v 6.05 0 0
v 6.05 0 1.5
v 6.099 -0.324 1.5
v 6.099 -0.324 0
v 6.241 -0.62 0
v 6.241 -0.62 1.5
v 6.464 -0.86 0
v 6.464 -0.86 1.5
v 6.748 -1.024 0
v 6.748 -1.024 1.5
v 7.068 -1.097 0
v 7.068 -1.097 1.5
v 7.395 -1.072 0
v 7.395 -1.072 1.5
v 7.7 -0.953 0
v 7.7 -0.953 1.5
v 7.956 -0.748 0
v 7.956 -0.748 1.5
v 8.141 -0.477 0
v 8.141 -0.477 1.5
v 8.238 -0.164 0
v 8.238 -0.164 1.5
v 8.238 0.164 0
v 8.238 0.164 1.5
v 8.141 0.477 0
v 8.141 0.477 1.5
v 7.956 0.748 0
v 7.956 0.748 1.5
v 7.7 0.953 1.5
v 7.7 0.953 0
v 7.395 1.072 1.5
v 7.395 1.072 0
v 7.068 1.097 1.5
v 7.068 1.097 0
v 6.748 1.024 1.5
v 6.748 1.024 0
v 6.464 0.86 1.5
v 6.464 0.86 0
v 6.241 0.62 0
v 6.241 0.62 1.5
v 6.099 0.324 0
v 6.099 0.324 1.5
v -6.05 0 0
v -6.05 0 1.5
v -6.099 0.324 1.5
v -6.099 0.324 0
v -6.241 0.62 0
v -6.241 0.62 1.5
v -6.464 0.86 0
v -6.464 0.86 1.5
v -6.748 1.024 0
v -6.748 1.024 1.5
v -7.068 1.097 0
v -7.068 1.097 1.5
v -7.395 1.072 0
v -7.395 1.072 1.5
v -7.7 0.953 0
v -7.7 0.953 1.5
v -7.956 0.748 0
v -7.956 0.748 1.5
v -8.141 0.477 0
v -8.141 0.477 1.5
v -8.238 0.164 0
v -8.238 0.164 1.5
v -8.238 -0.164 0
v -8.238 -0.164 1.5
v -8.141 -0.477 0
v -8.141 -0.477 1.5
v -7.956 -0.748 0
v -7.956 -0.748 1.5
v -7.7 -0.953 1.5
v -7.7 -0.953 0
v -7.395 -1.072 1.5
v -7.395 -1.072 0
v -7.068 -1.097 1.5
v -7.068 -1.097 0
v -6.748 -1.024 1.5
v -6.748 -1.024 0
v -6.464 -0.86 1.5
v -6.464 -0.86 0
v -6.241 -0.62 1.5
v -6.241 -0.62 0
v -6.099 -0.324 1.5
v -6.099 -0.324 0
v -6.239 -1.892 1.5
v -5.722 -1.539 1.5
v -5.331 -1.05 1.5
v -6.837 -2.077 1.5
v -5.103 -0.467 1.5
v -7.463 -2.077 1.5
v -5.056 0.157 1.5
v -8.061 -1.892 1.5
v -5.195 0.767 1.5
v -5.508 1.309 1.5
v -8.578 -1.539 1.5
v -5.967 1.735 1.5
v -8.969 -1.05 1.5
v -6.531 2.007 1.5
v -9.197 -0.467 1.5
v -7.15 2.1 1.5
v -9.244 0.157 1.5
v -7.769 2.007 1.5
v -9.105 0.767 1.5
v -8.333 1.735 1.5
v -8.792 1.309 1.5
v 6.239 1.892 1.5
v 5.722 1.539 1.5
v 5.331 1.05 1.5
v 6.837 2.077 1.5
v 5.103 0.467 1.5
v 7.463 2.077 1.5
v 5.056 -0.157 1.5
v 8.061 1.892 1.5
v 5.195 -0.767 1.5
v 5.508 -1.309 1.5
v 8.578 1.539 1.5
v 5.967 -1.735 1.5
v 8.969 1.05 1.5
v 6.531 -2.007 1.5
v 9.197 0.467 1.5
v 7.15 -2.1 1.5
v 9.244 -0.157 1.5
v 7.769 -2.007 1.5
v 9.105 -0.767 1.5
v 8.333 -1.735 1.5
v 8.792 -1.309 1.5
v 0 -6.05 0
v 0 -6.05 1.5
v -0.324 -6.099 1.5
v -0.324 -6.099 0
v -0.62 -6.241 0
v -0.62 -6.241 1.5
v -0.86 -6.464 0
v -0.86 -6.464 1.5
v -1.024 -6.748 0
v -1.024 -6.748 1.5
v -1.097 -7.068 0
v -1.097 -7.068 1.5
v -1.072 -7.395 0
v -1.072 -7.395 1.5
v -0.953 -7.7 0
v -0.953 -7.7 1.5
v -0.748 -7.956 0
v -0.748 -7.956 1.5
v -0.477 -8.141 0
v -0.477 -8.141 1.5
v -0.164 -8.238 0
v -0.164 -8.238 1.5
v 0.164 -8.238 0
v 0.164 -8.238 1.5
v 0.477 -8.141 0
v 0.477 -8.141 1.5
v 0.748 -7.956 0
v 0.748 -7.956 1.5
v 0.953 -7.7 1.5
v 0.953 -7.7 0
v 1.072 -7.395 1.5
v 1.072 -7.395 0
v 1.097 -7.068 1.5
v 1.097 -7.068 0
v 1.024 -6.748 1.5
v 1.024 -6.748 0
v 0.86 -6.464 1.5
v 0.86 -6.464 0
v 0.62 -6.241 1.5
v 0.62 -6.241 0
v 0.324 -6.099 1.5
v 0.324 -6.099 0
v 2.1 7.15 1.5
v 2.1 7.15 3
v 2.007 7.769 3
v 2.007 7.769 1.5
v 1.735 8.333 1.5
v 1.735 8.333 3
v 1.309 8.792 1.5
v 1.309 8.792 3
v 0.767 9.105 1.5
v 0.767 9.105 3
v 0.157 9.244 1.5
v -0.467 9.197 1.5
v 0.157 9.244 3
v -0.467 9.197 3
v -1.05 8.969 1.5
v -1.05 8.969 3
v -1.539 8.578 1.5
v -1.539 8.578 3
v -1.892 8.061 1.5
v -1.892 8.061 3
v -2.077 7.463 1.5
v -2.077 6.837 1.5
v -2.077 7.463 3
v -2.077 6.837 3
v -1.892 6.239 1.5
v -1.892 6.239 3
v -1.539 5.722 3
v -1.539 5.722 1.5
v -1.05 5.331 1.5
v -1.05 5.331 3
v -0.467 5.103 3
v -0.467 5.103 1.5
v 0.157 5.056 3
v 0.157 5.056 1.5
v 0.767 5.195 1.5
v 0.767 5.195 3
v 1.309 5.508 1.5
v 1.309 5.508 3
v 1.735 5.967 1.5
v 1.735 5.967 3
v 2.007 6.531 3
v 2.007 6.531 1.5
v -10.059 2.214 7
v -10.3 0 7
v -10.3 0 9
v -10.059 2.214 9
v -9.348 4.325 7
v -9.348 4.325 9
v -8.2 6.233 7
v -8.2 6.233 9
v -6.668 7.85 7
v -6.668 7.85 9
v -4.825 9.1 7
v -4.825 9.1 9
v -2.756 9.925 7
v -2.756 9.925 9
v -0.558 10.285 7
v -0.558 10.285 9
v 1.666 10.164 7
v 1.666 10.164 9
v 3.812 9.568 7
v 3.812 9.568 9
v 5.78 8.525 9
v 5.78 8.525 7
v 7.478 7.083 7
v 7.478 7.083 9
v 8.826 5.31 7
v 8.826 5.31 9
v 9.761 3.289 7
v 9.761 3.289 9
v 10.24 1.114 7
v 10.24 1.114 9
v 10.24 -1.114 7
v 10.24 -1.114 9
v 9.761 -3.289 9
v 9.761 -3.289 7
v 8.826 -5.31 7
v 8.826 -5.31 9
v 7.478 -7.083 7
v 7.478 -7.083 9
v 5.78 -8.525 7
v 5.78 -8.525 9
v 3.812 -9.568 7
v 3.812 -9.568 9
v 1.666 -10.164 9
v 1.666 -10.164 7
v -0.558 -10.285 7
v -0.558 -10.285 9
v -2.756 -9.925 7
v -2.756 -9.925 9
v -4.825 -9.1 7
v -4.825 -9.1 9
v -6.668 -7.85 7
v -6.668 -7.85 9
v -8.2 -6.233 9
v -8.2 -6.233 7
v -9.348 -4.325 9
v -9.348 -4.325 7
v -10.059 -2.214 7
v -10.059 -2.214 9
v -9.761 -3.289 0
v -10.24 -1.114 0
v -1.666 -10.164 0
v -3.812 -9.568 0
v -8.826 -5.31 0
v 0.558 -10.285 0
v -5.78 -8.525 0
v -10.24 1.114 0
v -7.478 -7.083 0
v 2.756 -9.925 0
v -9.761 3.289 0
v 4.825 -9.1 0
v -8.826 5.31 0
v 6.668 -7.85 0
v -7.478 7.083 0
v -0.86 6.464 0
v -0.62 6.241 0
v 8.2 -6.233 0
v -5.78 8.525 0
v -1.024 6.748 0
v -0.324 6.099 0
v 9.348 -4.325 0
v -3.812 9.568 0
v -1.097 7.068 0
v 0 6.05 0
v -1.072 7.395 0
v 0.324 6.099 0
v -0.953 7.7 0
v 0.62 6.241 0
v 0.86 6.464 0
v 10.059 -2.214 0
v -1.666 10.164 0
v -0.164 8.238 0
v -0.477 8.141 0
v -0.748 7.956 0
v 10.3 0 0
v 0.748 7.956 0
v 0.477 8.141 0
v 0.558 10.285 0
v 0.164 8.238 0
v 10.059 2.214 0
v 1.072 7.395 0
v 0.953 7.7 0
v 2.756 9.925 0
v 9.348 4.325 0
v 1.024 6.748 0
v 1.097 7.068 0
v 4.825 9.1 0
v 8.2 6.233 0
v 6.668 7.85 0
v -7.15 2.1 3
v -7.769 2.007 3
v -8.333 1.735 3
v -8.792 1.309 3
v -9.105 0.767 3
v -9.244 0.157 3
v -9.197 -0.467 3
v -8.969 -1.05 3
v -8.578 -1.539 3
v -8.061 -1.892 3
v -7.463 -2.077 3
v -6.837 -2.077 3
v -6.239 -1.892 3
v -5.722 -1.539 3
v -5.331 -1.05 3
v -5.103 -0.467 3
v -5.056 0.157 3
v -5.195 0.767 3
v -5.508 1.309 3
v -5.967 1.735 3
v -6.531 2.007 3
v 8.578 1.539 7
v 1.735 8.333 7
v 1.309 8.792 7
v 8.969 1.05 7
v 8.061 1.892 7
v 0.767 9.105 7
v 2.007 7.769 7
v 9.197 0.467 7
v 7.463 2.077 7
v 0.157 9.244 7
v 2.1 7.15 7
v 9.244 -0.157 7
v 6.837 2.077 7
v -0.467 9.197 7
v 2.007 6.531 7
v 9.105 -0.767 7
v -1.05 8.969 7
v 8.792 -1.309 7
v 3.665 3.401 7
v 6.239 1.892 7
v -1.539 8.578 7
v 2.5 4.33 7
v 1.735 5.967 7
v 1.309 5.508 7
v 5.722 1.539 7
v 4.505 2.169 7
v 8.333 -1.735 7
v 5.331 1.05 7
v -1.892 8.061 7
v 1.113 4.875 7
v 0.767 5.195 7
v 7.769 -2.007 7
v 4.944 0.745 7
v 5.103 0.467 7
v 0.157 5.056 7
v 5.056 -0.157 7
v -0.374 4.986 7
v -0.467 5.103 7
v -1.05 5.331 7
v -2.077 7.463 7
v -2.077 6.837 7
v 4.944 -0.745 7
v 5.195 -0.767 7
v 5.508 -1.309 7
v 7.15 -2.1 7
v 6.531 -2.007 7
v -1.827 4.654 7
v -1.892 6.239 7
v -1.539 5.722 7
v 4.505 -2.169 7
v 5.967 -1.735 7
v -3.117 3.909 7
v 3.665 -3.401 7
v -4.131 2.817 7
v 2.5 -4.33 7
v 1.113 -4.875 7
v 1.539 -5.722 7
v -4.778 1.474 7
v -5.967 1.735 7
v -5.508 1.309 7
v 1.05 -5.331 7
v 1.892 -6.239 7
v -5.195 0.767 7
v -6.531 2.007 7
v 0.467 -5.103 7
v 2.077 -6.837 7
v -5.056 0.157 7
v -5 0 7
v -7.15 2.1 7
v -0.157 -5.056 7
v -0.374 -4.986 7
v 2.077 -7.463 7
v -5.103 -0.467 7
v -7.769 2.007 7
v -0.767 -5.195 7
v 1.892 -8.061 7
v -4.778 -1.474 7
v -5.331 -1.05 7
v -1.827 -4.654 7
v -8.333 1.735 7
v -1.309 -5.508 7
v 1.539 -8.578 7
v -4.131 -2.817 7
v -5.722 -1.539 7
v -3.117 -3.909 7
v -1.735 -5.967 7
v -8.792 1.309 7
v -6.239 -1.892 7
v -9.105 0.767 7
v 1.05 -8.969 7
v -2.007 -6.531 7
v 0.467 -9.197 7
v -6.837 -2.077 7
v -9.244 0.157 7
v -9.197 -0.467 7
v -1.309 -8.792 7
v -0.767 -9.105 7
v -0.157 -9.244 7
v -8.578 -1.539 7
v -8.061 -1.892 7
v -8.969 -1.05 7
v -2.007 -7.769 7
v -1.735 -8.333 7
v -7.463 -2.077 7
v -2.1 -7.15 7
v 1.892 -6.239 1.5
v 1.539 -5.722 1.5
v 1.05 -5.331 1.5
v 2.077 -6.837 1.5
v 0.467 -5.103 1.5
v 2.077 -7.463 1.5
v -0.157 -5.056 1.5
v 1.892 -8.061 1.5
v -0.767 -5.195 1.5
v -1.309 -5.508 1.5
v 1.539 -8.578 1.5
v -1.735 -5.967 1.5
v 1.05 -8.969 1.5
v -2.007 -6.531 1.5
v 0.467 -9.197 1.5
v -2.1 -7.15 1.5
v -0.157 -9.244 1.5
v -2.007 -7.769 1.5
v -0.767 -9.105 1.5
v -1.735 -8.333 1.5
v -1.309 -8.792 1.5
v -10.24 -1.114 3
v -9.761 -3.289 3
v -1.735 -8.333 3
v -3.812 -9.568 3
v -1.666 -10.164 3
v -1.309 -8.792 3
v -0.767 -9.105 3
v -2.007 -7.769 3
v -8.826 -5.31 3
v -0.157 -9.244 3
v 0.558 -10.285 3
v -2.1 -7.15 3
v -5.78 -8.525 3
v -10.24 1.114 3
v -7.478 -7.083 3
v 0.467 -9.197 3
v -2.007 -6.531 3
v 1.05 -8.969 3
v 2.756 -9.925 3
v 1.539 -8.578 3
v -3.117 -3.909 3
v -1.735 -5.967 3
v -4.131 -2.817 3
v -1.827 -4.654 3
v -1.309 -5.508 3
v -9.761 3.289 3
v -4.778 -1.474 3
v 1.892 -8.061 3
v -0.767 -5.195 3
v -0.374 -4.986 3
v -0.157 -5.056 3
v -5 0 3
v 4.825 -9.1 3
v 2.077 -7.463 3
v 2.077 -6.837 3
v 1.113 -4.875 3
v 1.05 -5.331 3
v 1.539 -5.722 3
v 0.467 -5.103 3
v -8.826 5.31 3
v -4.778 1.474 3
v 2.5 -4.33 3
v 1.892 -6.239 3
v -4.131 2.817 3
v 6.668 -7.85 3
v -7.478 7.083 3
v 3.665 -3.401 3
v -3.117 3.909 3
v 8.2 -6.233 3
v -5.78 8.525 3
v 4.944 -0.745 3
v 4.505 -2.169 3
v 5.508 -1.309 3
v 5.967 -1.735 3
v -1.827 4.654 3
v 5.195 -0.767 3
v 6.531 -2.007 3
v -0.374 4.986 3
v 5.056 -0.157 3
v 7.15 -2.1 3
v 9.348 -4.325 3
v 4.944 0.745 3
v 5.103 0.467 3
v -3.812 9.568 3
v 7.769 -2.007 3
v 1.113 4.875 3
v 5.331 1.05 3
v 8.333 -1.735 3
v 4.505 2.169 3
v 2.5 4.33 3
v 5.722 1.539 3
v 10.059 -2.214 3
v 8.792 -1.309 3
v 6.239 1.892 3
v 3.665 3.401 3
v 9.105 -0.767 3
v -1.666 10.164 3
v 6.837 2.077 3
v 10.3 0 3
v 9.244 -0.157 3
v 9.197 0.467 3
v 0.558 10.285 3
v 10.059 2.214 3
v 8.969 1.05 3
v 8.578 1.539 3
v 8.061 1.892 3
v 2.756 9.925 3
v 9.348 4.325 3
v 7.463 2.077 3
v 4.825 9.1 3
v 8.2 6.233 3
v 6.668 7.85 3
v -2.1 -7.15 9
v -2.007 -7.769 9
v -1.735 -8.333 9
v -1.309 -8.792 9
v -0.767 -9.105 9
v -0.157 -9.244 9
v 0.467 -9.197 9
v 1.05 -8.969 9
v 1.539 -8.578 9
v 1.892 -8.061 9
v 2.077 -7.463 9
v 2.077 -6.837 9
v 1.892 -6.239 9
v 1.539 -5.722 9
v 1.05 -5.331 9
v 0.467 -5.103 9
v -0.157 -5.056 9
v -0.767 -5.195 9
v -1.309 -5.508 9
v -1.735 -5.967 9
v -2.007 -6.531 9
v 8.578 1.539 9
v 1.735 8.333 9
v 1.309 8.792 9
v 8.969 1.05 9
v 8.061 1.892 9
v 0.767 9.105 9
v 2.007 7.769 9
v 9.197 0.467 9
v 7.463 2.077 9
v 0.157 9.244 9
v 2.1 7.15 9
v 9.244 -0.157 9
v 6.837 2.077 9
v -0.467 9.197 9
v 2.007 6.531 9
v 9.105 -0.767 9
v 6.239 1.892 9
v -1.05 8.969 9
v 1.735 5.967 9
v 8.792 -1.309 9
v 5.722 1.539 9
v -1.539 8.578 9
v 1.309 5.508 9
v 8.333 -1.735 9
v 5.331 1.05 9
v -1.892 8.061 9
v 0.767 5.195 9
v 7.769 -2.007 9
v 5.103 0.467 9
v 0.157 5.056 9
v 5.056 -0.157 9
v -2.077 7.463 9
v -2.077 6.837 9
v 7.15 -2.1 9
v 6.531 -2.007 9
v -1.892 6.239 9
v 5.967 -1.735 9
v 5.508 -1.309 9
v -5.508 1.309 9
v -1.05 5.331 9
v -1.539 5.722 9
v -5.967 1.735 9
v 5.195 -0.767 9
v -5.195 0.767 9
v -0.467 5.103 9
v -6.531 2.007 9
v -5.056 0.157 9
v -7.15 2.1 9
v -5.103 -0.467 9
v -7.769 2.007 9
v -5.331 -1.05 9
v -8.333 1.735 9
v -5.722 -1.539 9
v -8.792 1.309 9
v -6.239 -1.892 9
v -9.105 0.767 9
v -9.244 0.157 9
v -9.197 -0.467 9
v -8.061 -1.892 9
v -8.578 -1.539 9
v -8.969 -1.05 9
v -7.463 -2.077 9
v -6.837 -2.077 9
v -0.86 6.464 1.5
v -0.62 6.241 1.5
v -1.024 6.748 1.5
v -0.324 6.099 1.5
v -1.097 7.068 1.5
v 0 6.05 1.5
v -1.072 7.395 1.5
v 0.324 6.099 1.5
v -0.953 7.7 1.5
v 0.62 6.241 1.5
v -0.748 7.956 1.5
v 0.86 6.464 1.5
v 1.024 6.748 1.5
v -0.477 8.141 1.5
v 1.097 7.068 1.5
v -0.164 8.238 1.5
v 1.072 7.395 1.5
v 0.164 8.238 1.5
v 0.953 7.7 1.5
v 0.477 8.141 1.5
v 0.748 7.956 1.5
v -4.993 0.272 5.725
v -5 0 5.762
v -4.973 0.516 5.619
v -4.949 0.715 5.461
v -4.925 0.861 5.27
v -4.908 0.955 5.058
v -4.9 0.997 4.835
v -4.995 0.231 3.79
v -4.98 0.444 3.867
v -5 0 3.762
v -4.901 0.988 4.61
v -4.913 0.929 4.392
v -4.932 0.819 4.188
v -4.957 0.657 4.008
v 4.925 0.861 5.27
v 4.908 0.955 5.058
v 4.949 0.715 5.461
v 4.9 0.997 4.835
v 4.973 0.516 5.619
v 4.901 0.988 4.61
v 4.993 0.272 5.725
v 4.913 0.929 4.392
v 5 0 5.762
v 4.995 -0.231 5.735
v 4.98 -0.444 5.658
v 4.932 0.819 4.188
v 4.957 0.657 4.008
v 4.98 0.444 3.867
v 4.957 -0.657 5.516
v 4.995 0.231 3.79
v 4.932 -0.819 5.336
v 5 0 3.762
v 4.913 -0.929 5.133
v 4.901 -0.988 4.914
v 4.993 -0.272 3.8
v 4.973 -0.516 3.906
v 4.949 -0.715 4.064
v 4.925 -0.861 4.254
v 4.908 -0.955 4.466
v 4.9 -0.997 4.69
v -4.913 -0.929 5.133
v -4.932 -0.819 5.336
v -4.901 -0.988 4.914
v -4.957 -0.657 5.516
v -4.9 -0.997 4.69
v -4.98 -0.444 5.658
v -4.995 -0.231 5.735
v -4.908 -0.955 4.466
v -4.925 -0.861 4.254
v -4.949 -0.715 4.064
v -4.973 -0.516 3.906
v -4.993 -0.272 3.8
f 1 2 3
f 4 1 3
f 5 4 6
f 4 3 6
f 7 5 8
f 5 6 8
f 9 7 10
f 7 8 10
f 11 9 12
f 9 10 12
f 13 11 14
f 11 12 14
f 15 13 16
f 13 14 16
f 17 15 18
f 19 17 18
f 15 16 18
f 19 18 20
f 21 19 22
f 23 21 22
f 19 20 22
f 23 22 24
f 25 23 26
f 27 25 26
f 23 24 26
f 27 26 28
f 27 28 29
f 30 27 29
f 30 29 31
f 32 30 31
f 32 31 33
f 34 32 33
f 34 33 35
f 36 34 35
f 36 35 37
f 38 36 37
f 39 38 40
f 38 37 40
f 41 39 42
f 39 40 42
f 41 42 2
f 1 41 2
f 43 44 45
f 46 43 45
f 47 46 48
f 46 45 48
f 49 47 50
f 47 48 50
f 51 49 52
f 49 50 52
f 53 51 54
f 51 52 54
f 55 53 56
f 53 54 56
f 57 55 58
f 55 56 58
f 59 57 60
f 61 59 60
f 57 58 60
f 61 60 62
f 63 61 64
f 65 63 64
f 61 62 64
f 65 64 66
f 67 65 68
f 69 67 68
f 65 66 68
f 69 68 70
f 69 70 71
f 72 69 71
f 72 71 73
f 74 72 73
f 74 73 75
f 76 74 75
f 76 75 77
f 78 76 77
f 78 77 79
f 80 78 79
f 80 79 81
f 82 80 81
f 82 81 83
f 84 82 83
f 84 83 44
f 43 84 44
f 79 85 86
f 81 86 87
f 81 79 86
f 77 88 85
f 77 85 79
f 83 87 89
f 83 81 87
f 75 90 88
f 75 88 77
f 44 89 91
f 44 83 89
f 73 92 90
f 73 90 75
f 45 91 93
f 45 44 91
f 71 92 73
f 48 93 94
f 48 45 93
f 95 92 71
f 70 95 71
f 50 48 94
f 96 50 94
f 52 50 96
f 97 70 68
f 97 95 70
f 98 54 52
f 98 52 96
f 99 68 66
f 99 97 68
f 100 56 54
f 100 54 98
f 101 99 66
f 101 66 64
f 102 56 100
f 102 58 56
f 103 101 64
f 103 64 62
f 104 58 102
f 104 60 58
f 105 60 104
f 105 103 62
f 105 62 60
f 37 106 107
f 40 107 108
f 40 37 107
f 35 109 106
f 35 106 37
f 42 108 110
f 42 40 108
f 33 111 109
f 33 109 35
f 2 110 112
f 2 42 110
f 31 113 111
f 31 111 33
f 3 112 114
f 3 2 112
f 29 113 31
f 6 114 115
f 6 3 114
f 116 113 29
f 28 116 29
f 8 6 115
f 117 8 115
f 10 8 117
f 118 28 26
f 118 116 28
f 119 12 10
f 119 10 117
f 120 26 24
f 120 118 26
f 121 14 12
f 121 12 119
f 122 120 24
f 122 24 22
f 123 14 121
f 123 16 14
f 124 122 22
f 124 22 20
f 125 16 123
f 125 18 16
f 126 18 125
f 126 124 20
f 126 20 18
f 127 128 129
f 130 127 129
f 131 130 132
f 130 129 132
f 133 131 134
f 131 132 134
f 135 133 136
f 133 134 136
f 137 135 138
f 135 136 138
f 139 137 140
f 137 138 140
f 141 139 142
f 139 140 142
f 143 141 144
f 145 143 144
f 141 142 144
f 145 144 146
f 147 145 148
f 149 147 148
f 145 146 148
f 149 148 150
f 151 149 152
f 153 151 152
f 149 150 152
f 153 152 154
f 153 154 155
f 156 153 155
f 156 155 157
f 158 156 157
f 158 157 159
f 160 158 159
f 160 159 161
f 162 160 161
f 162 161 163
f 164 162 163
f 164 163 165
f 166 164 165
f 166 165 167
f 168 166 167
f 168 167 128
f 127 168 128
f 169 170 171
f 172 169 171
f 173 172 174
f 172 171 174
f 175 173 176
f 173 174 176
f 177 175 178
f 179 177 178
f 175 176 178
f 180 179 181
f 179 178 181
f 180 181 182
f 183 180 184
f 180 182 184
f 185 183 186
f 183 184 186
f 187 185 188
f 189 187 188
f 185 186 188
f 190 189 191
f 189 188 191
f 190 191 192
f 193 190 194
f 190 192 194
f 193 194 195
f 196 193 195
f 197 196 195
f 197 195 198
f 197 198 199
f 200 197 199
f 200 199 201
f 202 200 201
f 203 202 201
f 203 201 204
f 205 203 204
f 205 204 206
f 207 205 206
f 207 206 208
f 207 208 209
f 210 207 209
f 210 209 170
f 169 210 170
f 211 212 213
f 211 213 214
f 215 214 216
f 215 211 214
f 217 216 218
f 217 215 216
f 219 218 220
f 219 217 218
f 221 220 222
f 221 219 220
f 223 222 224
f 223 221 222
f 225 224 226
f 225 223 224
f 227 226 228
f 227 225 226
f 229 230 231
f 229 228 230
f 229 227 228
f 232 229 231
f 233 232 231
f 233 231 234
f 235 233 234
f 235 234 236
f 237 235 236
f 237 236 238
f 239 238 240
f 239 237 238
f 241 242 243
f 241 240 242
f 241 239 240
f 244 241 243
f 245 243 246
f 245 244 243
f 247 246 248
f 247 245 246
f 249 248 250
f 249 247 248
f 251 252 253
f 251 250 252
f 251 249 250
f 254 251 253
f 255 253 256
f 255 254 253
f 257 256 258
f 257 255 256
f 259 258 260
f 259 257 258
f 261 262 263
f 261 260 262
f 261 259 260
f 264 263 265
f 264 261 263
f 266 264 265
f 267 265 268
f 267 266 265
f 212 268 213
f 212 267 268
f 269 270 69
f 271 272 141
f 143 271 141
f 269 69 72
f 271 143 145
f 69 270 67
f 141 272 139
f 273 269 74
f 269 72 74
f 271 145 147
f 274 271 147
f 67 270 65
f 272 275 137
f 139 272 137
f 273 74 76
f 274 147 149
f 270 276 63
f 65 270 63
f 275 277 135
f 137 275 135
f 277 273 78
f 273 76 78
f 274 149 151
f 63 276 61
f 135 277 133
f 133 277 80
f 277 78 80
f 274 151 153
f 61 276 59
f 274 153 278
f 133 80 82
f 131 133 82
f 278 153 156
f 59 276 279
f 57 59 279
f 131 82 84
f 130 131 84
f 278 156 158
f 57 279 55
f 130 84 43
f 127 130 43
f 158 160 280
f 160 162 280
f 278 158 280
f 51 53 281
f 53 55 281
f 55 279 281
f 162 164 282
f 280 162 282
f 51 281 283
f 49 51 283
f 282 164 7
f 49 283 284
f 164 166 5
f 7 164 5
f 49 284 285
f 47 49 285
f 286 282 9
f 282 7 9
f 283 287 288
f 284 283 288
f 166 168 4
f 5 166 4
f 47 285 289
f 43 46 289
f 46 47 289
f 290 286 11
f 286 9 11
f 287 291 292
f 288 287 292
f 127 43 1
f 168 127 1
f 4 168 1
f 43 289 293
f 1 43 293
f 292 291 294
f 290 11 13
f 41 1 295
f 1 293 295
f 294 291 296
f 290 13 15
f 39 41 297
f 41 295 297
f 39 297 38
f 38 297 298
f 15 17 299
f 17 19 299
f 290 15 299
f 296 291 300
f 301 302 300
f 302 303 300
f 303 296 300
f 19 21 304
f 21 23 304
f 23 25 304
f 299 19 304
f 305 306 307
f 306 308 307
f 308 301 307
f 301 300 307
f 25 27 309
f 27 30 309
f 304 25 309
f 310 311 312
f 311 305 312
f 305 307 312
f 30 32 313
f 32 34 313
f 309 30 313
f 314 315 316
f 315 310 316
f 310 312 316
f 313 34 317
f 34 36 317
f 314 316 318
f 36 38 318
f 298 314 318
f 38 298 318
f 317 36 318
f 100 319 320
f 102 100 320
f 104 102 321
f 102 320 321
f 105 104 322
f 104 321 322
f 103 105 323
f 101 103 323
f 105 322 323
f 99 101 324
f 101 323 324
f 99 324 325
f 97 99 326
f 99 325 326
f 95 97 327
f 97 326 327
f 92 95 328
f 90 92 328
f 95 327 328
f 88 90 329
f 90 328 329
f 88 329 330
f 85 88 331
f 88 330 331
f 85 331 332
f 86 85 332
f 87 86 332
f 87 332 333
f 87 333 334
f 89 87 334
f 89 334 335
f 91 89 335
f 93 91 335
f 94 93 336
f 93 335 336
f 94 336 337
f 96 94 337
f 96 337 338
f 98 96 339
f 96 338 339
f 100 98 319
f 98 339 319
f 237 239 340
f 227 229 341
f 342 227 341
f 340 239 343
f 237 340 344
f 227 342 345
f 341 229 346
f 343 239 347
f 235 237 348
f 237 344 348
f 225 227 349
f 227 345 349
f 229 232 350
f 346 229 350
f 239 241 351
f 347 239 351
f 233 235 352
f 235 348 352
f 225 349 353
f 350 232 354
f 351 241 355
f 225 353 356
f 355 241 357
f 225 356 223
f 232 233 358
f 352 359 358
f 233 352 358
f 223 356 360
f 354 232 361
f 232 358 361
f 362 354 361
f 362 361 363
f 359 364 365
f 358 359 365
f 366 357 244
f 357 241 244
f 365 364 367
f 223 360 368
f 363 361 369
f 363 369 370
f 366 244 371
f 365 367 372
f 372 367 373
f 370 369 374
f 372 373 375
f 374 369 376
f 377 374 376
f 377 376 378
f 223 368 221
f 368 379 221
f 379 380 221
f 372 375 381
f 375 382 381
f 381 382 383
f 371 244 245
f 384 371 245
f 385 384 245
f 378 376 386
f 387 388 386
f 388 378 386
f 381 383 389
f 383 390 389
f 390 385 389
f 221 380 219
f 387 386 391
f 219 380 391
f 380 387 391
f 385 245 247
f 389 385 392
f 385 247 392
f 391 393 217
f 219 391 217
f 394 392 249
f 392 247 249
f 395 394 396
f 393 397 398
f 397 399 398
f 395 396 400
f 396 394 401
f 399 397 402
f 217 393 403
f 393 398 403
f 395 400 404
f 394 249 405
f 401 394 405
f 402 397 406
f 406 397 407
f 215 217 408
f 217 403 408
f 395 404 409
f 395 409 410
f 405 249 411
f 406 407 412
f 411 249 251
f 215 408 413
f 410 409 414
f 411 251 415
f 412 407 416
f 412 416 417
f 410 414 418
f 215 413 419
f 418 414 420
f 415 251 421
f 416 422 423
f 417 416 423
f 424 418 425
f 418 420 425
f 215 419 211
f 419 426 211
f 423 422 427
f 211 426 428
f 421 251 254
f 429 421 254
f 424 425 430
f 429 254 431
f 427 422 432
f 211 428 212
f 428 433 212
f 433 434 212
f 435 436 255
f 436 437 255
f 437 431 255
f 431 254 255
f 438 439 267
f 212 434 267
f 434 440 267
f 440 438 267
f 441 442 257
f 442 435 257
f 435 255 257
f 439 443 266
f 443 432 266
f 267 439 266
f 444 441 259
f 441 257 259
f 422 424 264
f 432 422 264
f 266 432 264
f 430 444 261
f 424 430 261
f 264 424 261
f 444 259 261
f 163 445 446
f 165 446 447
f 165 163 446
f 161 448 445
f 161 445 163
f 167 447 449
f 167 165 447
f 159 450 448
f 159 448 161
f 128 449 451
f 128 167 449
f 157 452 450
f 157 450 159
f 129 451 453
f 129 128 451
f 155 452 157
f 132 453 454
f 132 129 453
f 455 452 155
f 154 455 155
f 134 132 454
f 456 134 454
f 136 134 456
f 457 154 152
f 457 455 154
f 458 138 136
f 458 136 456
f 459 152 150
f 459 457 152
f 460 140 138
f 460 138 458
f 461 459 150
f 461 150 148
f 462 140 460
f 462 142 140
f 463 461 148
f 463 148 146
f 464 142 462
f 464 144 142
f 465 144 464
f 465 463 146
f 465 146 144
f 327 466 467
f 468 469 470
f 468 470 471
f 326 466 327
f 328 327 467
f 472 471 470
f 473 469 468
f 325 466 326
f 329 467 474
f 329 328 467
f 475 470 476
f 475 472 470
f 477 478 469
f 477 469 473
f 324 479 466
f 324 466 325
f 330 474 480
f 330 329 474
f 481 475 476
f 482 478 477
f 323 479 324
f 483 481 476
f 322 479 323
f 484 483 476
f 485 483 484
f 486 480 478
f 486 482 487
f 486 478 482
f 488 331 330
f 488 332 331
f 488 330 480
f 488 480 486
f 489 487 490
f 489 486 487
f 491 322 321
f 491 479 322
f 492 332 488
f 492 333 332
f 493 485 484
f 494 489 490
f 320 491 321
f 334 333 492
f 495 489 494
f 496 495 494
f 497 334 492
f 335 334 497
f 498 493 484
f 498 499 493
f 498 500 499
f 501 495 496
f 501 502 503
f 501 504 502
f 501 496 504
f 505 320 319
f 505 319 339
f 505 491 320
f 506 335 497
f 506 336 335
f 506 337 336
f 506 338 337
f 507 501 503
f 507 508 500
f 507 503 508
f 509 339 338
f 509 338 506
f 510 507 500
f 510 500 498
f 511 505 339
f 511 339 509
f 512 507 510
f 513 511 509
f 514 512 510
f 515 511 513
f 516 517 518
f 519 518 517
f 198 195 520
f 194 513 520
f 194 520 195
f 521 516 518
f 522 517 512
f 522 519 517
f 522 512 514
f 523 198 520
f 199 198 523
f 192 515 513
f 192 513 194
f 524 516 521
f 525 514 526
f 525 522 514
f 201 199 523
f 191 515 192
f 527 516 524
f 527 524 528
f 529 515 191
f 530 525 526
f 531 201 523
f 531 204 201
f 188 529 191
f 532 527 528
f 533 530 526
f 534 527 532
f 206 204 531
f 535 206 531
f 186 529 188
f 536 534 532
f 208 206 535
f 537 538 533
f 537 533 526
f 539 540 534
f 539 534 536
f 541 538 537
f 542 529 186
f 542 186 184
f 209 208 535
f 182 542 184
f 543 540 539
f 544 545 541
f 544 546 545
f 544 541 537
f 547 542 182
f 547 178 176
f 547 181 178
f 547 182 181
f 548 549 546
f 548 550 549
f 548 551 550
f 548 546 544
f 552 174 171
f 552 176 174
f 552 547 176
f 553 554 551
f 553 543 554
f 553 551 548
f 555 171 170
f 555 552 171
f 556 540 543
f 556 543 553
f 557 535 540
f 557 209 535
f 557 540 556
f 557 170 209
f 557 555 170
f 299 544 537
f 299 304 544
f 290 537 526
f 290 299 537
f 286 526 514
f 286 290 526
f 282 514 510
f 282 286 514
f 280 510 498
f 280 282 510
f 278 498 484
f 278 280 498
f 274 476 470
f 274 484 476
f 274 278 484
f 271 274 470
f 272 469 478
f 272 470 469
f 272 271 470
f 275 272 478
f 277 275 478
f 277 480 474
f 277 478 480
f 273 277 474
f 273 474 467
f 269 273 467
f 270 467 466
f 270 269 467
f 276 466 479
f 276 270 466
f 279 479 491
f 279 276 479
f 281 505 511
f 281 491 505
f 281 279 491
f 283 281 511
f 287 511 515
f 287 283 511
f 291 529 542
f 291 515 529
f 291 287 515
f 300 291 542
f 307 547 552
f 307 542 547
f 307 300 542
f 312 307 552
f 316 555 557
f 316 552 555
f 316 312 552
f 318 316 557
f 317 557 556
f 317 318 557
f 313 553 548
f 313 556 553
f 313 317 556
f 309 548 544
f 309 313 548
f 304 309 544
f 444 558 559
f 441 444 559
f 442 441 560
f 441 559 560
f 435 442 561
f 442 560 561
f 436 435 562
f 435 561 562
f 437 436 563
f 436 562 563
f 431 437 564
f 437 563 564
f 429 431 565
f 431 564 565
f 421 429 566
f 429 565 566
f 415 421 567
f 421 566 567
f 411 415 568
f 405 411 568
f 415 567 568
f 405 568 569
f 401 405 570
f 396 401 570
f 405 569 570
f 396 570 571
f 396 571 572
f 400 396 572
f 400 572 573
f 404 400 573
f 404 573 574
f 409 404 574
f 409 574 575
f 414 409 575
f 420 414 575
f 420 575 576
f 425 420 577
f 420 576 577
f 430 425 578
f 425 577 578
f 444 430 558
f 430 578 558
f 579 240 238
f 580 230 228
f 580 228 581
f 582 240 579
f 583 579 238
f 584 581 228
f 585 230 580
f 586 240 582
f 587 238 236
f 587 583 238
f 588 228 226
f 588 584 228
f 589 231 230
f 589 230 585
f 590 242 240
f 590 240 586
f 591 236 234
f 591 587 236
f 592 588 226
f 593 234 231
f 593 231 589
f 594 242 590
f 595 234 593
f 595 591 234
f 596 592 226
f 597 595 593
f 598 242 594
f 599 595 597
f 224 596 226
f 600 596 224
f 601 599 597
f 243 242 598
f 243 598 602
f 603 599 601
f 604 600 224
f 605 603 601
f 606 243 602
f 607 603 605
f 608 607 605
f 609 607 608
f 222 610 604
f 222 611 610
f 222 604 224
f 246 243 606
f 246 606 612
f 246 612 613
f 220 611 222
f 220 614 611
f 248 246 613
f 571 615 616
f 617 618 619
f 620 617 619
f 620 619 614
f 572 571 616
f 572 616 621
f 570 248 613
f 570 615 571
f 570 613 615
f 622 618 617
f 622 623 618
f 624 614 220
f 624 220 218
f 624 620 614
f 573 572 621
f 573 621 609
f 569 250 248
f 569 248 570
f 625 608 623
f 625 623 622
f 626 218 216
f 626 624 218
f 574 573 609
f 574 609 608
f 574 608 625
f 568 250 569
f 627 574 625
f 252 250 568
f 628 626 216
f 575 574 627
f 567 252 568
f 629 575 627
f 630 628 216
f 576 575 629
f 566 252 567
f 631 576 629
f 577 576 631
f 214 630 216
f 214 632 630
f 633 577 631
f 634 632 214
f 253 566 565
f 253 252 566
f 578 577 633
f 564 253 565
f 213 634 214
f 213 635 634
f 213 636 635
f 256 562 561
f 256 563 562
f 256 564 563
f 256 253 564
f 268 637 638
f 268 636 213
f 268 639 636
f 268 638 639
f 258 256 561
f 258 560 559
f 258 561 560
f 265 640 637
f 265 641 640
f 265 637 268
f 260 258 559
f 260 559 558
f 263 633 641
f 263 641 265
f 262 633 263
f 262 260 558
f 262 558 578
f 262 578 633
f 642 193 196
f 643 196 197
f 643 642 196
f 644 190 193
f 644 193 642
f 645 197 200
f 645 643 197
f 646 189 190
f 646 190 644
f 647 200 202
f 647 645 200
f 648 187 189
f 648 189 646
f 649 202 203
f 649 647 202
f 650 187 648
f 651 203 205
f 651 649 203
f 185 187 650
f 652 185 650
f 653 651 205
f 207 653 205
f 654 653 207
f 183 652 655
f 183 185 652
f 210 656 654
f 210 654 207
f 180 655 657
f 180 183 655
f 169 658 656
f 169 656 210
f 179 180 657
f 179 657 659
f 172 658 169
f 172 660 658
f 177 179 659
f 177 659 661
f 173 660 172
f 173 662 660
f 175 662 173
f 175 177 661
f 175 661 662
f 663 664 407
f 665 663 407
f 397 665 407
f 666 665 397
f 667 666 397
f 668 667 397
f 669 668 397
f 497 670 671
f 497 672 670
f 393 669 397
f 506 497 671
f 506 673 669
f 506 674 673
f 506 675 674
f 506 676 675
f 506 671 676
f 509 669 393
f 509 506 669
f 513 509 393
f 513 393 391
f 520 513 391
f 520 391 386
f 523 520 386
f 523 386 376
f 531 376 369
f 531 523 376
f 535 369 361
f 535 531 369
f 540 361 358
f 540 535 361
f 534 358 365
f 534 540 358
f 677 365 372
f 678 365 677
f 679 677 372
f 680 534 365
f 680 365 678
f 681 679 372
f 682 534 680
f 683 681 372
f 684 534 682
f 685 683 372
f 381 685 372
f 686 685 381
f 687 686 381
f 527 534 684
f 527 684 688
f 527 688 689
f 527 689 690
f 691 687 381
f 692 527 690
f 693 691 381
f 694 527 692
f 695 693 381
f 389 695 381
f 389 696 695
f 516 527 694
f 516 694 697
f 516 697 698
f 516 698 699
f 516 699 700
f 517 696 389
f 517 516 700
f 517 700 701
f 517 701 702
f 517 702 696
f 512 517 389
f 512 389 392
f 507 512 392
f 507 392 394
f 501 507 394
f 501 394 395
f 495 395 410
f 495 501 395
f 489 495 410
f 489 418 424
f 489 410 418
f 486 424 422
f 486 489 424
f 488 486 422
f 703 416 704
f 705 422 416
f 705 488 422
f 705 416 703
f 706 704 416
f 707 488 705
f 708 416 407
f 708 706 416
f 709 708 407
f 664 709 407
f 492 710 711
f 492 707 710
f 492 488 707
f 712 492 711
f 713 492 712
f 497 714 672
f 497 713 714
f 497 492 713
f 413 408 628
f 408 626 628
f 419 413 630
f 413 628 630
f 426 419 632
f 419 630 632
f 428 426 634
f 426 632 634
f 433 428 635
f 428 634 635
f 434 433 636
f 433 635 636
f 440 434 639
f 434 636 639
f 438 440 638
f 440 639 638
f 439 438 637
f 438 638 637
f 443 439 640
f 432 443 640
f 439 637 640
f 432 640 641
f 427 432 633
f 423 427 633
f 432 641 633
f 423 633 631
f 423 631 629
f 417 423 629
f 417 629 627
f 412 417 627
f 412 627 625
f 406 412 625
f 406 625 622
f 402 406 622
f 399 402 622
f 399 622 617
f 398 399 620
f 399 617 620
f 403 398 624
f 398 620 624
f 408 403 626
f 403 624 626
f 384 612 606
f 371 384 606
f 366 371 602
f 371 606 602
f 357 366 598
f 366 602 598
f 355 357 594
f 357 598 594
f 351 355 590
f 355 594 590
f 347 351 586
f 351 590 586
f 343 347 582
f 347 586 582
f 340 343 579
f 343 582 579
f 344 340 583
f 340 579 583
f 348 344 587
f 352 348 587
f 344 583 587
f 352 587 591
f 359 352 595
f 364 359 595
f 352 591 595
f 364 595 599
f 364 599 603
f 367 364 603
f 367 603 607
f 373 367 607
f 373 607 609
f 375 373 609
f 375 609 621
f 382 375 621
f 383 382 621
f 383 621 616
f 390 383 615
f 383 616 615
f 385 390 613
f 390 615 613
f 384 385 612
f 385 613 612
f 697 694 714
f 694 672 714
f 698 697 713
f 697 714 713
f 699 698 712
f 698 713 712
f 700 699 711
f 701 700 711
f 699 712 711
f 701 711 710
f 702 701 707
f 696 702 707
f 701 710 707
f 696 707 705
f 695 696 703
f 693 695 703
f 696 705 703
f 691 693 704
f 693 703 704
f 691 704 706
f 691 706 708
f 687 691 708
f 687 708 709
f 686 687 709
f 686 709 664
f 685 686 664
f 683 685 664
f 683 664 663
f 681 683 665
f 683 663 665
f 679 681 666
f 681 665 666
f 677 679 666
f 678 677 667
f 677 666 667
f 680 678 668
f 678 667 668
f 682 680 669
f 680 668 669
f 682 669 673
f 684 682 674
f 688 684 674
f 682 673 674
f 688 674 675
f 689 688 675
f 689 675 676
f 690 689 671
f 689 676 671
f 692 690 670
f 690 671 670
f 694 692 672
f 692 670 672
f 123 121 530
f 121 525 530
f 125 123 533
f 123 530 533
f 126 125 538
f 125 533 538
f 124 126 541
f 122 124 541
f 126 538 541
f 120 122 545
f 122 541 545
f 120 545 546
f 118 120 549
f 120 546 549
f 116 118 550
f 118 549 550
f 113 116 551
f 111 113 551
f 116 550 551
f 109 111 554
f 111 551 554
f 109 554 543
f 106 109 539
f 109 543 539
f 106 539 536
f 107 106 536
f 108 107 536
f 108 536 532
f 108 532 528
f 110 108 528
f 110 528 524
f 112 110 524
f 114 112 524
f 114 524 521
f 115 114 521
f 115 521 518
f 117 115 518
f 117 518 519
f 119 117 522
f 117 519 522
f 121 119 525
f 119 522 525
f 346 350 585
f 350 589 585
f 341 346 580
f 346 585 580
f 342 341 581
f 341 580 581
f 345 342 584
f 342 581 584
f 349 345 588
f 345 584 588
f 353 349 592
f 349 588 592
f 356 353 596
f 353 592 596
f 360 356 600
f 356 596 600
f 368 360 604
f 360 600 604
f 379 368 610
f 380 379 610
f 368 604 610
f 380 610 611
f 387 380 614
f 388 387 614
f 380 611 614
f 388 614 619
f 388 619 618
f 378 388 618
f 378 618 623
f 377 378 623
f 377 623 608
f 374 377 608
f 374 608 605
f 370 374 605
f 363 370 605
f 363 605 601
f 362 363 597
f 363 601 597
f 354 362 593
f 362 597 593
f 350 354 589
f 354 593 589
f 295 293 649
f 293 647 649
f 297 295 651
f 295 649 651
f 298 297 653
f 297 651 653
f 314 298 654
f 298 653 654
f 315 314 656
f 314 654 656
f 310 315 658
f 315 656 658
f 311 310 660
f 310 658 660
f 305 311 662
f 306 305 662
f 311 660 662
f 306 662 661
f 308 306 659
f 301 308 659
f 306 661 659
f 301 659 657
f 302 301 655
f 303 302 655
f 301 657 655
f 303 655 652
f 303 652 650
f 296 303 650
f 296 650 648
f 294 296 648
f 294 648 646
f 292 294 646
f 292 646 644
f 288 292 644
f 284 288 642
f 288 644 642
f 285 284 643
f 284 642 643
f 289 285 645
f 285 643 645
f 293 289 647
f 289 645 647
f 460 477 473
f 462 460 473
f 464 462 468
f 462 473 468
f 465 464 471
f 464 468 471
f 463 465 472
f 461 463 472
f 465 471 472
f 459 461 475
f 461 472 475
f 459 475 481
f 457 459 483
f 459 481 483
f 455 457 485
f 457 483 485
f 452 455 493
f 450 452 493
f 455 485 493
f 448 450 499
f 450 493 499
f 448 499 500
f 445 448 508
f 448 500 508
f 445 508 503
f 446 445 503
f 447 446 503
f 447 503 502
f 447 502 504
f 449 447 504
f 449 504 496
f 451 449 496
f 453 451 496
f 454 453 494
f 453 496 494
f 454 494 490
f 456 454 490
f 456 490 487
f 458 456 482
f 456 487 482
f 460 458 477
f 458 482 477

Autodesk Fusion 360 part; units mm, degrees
sketch "Sketch1" plane through (0, 0, 0) normal (0, 0, 1) x (1, 0, 0)
  circle A0 centre (0, 0) radius 10.3
  dimension "d1" = 20.6
extrude "Extrude1" add sketch "Sketch1" along normal blind 3
sketch "Sketch2" plane through (0, 0, 3) normal (0, 0, 1) x (-1, 0, 0)
  circle A0 centre (0, 0) radius 10.3
  circle A1 centre (0, 0) radius 5
  dimension "d4" = 10
extrude "Extrude2" add sketch "Sketch2" along normal blind 4 contours A1
sketch "Sketch3" plane through (0, 0, 7) normal (0, 0, 1) x (-1, 0, 0)
  circle A0 centre (0, 0) radius 5
  circle A1 centre (0, 0) radius 10.3
  dimension "d7" = 20.6
extrude "Extrude3" add sketch "Sketch3" along normal blind 2 contours A0 | A1
sketch "Sketch4" plane through (0, 0, 9) normal (0, 0, 1) x (-1, 0, 0)
  circle A0 centre (0, 0) radius 10.3
  circle A1 centre (-7.15, 0) radius 1.1
  line L0 (0, 0) -> (-7.15, 0)
  dimension "d10" = 2.2
  dimension "d23" = 7.15
extrude "Extrude4" cut sketch "Sketch4" against normal blind 9 contours A1
pattern_circular "C-Pattern1" count 4 over 360 about axis through (0, 0, 7) along (0, 0, 1) of "Extrude4"
sketch "Sketch5" plane through (0, 0, 9) normal (0, 0, 1) x (-1, 0, 0)
  circle A0 centre (0, 7.15) radius 1.1
  circle A1 centre (7.15, 0) radius 1.1
  circle A2 centre (0, -7.15) radius 1.1
  circle A3 centre (-7.15, 0) radius 1.1
  circle A4 centre (0, 0) radius 10.3
  circle A5 centre (0, 7.15) radius 2.1
  dimension "d19" = 4.2
extrude "Extrude5" cut sketch "Sketch5" against normal blind 7.5 contours A5
pattern_circular "C-Pattern2" count 4 over 360 about axis through (0, 0, 3) along (0, 0, 1) of "Extrude5"
hole "Hole1" at (5, 0, 4.7624) direction (-1, 0, 0) diameter 2 depth 10 tip angle 180
